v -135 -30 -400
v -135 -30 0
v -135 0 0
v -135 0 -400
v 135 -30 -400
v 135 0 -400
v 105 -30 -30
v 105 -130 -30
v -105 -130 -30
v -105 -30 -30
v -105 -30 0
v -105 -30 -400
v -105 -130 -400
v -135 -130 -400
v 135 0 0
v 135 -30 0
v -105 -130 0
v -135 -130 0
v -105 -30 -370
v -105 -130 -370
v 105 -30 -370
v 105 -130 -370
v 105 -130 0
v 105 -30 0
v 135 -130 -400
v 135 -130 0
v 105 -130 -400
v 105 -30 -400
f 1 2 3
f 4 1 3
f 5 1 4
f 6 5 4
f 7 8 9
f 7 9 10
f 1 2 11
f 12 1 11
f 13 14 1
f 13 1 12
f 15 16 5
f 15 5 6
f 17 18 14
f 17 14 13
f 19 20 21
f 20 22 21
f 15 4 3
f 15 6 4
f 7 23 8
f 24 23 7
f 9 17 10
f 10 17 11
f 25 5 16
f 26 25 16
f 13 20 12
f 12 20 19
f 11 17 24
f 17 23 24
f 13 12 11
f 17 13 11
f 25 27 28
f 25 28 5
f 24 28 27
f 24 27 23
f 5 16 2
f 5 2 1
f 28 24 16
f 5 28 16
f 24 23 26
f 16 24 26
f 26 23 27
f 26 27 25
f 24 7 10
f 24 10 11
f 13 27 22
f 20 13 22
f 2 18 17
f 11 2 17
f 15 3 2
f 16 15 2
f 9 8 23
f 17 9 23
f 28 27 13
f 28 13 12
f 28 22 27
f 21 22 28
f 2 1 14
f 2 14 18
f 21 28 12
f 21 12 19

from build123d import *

# Parameters (mm, degrees)
F1_DEPTH = 135
F0_W     = 100
F0_H     = 30
F2_DEPTH = 105
F3_DEPTH = 105
F4_W     = 30
F4_H     = 400
F5_DEPTH = 100
F6_DEPTH = 100


with BuildPart() as f1:
    # F0 (on Right) → F1 (new body, symmetric)
    with BuildSketch(Plane.YZ):
        Polygon((0, -400), (0, 0), (-30, 0), (-30, -30), (-30, -370), (-30, -400), align=None)
    extrude(amount=F1_DEPTH, both=True)


with BuildPart() as f2:
    # F0 (on Right) → F2 (new body, symmetric)
    with BuildSketch(Plane.YZ):
        with Locations((-80, -15)):
            Rectangle(F0_W, F0_H)
    extrude(amount=F2_DEPTH, both=True)


with BuildPart() as f3:
    # F0 (on Right) → F3 (new body, symmetric)
    with BuildSketch(Plane.YZ):
        with Locations((-80, -385)):
            Rectangle(F0_W, F0_H)
    extrude(amount=F3_DEPTH, both=True)


with BuildPart() as f5:
    # F4 (on face) → F5 (new body, through all)
    with BuildSketch(Plane.XZ.offset(30)):
        with Locations((-120, -200)):
            Rectangle(F4_W, F4_H)
    extrude(amount=F5_DEPTH)


with BuildPart() as f6:
    # F4 (on face) → F6 (new body, through all)
    with BuildSketch(Plane.XZ.offset(30)):
        with Locations((120, -200)):
            Rectangle(F4_W, F4_H)
    extrude(amount=F6_DEPTH)


solid = Compound([f1.part, f2.part, f3.part, f5.part, f6.part])
